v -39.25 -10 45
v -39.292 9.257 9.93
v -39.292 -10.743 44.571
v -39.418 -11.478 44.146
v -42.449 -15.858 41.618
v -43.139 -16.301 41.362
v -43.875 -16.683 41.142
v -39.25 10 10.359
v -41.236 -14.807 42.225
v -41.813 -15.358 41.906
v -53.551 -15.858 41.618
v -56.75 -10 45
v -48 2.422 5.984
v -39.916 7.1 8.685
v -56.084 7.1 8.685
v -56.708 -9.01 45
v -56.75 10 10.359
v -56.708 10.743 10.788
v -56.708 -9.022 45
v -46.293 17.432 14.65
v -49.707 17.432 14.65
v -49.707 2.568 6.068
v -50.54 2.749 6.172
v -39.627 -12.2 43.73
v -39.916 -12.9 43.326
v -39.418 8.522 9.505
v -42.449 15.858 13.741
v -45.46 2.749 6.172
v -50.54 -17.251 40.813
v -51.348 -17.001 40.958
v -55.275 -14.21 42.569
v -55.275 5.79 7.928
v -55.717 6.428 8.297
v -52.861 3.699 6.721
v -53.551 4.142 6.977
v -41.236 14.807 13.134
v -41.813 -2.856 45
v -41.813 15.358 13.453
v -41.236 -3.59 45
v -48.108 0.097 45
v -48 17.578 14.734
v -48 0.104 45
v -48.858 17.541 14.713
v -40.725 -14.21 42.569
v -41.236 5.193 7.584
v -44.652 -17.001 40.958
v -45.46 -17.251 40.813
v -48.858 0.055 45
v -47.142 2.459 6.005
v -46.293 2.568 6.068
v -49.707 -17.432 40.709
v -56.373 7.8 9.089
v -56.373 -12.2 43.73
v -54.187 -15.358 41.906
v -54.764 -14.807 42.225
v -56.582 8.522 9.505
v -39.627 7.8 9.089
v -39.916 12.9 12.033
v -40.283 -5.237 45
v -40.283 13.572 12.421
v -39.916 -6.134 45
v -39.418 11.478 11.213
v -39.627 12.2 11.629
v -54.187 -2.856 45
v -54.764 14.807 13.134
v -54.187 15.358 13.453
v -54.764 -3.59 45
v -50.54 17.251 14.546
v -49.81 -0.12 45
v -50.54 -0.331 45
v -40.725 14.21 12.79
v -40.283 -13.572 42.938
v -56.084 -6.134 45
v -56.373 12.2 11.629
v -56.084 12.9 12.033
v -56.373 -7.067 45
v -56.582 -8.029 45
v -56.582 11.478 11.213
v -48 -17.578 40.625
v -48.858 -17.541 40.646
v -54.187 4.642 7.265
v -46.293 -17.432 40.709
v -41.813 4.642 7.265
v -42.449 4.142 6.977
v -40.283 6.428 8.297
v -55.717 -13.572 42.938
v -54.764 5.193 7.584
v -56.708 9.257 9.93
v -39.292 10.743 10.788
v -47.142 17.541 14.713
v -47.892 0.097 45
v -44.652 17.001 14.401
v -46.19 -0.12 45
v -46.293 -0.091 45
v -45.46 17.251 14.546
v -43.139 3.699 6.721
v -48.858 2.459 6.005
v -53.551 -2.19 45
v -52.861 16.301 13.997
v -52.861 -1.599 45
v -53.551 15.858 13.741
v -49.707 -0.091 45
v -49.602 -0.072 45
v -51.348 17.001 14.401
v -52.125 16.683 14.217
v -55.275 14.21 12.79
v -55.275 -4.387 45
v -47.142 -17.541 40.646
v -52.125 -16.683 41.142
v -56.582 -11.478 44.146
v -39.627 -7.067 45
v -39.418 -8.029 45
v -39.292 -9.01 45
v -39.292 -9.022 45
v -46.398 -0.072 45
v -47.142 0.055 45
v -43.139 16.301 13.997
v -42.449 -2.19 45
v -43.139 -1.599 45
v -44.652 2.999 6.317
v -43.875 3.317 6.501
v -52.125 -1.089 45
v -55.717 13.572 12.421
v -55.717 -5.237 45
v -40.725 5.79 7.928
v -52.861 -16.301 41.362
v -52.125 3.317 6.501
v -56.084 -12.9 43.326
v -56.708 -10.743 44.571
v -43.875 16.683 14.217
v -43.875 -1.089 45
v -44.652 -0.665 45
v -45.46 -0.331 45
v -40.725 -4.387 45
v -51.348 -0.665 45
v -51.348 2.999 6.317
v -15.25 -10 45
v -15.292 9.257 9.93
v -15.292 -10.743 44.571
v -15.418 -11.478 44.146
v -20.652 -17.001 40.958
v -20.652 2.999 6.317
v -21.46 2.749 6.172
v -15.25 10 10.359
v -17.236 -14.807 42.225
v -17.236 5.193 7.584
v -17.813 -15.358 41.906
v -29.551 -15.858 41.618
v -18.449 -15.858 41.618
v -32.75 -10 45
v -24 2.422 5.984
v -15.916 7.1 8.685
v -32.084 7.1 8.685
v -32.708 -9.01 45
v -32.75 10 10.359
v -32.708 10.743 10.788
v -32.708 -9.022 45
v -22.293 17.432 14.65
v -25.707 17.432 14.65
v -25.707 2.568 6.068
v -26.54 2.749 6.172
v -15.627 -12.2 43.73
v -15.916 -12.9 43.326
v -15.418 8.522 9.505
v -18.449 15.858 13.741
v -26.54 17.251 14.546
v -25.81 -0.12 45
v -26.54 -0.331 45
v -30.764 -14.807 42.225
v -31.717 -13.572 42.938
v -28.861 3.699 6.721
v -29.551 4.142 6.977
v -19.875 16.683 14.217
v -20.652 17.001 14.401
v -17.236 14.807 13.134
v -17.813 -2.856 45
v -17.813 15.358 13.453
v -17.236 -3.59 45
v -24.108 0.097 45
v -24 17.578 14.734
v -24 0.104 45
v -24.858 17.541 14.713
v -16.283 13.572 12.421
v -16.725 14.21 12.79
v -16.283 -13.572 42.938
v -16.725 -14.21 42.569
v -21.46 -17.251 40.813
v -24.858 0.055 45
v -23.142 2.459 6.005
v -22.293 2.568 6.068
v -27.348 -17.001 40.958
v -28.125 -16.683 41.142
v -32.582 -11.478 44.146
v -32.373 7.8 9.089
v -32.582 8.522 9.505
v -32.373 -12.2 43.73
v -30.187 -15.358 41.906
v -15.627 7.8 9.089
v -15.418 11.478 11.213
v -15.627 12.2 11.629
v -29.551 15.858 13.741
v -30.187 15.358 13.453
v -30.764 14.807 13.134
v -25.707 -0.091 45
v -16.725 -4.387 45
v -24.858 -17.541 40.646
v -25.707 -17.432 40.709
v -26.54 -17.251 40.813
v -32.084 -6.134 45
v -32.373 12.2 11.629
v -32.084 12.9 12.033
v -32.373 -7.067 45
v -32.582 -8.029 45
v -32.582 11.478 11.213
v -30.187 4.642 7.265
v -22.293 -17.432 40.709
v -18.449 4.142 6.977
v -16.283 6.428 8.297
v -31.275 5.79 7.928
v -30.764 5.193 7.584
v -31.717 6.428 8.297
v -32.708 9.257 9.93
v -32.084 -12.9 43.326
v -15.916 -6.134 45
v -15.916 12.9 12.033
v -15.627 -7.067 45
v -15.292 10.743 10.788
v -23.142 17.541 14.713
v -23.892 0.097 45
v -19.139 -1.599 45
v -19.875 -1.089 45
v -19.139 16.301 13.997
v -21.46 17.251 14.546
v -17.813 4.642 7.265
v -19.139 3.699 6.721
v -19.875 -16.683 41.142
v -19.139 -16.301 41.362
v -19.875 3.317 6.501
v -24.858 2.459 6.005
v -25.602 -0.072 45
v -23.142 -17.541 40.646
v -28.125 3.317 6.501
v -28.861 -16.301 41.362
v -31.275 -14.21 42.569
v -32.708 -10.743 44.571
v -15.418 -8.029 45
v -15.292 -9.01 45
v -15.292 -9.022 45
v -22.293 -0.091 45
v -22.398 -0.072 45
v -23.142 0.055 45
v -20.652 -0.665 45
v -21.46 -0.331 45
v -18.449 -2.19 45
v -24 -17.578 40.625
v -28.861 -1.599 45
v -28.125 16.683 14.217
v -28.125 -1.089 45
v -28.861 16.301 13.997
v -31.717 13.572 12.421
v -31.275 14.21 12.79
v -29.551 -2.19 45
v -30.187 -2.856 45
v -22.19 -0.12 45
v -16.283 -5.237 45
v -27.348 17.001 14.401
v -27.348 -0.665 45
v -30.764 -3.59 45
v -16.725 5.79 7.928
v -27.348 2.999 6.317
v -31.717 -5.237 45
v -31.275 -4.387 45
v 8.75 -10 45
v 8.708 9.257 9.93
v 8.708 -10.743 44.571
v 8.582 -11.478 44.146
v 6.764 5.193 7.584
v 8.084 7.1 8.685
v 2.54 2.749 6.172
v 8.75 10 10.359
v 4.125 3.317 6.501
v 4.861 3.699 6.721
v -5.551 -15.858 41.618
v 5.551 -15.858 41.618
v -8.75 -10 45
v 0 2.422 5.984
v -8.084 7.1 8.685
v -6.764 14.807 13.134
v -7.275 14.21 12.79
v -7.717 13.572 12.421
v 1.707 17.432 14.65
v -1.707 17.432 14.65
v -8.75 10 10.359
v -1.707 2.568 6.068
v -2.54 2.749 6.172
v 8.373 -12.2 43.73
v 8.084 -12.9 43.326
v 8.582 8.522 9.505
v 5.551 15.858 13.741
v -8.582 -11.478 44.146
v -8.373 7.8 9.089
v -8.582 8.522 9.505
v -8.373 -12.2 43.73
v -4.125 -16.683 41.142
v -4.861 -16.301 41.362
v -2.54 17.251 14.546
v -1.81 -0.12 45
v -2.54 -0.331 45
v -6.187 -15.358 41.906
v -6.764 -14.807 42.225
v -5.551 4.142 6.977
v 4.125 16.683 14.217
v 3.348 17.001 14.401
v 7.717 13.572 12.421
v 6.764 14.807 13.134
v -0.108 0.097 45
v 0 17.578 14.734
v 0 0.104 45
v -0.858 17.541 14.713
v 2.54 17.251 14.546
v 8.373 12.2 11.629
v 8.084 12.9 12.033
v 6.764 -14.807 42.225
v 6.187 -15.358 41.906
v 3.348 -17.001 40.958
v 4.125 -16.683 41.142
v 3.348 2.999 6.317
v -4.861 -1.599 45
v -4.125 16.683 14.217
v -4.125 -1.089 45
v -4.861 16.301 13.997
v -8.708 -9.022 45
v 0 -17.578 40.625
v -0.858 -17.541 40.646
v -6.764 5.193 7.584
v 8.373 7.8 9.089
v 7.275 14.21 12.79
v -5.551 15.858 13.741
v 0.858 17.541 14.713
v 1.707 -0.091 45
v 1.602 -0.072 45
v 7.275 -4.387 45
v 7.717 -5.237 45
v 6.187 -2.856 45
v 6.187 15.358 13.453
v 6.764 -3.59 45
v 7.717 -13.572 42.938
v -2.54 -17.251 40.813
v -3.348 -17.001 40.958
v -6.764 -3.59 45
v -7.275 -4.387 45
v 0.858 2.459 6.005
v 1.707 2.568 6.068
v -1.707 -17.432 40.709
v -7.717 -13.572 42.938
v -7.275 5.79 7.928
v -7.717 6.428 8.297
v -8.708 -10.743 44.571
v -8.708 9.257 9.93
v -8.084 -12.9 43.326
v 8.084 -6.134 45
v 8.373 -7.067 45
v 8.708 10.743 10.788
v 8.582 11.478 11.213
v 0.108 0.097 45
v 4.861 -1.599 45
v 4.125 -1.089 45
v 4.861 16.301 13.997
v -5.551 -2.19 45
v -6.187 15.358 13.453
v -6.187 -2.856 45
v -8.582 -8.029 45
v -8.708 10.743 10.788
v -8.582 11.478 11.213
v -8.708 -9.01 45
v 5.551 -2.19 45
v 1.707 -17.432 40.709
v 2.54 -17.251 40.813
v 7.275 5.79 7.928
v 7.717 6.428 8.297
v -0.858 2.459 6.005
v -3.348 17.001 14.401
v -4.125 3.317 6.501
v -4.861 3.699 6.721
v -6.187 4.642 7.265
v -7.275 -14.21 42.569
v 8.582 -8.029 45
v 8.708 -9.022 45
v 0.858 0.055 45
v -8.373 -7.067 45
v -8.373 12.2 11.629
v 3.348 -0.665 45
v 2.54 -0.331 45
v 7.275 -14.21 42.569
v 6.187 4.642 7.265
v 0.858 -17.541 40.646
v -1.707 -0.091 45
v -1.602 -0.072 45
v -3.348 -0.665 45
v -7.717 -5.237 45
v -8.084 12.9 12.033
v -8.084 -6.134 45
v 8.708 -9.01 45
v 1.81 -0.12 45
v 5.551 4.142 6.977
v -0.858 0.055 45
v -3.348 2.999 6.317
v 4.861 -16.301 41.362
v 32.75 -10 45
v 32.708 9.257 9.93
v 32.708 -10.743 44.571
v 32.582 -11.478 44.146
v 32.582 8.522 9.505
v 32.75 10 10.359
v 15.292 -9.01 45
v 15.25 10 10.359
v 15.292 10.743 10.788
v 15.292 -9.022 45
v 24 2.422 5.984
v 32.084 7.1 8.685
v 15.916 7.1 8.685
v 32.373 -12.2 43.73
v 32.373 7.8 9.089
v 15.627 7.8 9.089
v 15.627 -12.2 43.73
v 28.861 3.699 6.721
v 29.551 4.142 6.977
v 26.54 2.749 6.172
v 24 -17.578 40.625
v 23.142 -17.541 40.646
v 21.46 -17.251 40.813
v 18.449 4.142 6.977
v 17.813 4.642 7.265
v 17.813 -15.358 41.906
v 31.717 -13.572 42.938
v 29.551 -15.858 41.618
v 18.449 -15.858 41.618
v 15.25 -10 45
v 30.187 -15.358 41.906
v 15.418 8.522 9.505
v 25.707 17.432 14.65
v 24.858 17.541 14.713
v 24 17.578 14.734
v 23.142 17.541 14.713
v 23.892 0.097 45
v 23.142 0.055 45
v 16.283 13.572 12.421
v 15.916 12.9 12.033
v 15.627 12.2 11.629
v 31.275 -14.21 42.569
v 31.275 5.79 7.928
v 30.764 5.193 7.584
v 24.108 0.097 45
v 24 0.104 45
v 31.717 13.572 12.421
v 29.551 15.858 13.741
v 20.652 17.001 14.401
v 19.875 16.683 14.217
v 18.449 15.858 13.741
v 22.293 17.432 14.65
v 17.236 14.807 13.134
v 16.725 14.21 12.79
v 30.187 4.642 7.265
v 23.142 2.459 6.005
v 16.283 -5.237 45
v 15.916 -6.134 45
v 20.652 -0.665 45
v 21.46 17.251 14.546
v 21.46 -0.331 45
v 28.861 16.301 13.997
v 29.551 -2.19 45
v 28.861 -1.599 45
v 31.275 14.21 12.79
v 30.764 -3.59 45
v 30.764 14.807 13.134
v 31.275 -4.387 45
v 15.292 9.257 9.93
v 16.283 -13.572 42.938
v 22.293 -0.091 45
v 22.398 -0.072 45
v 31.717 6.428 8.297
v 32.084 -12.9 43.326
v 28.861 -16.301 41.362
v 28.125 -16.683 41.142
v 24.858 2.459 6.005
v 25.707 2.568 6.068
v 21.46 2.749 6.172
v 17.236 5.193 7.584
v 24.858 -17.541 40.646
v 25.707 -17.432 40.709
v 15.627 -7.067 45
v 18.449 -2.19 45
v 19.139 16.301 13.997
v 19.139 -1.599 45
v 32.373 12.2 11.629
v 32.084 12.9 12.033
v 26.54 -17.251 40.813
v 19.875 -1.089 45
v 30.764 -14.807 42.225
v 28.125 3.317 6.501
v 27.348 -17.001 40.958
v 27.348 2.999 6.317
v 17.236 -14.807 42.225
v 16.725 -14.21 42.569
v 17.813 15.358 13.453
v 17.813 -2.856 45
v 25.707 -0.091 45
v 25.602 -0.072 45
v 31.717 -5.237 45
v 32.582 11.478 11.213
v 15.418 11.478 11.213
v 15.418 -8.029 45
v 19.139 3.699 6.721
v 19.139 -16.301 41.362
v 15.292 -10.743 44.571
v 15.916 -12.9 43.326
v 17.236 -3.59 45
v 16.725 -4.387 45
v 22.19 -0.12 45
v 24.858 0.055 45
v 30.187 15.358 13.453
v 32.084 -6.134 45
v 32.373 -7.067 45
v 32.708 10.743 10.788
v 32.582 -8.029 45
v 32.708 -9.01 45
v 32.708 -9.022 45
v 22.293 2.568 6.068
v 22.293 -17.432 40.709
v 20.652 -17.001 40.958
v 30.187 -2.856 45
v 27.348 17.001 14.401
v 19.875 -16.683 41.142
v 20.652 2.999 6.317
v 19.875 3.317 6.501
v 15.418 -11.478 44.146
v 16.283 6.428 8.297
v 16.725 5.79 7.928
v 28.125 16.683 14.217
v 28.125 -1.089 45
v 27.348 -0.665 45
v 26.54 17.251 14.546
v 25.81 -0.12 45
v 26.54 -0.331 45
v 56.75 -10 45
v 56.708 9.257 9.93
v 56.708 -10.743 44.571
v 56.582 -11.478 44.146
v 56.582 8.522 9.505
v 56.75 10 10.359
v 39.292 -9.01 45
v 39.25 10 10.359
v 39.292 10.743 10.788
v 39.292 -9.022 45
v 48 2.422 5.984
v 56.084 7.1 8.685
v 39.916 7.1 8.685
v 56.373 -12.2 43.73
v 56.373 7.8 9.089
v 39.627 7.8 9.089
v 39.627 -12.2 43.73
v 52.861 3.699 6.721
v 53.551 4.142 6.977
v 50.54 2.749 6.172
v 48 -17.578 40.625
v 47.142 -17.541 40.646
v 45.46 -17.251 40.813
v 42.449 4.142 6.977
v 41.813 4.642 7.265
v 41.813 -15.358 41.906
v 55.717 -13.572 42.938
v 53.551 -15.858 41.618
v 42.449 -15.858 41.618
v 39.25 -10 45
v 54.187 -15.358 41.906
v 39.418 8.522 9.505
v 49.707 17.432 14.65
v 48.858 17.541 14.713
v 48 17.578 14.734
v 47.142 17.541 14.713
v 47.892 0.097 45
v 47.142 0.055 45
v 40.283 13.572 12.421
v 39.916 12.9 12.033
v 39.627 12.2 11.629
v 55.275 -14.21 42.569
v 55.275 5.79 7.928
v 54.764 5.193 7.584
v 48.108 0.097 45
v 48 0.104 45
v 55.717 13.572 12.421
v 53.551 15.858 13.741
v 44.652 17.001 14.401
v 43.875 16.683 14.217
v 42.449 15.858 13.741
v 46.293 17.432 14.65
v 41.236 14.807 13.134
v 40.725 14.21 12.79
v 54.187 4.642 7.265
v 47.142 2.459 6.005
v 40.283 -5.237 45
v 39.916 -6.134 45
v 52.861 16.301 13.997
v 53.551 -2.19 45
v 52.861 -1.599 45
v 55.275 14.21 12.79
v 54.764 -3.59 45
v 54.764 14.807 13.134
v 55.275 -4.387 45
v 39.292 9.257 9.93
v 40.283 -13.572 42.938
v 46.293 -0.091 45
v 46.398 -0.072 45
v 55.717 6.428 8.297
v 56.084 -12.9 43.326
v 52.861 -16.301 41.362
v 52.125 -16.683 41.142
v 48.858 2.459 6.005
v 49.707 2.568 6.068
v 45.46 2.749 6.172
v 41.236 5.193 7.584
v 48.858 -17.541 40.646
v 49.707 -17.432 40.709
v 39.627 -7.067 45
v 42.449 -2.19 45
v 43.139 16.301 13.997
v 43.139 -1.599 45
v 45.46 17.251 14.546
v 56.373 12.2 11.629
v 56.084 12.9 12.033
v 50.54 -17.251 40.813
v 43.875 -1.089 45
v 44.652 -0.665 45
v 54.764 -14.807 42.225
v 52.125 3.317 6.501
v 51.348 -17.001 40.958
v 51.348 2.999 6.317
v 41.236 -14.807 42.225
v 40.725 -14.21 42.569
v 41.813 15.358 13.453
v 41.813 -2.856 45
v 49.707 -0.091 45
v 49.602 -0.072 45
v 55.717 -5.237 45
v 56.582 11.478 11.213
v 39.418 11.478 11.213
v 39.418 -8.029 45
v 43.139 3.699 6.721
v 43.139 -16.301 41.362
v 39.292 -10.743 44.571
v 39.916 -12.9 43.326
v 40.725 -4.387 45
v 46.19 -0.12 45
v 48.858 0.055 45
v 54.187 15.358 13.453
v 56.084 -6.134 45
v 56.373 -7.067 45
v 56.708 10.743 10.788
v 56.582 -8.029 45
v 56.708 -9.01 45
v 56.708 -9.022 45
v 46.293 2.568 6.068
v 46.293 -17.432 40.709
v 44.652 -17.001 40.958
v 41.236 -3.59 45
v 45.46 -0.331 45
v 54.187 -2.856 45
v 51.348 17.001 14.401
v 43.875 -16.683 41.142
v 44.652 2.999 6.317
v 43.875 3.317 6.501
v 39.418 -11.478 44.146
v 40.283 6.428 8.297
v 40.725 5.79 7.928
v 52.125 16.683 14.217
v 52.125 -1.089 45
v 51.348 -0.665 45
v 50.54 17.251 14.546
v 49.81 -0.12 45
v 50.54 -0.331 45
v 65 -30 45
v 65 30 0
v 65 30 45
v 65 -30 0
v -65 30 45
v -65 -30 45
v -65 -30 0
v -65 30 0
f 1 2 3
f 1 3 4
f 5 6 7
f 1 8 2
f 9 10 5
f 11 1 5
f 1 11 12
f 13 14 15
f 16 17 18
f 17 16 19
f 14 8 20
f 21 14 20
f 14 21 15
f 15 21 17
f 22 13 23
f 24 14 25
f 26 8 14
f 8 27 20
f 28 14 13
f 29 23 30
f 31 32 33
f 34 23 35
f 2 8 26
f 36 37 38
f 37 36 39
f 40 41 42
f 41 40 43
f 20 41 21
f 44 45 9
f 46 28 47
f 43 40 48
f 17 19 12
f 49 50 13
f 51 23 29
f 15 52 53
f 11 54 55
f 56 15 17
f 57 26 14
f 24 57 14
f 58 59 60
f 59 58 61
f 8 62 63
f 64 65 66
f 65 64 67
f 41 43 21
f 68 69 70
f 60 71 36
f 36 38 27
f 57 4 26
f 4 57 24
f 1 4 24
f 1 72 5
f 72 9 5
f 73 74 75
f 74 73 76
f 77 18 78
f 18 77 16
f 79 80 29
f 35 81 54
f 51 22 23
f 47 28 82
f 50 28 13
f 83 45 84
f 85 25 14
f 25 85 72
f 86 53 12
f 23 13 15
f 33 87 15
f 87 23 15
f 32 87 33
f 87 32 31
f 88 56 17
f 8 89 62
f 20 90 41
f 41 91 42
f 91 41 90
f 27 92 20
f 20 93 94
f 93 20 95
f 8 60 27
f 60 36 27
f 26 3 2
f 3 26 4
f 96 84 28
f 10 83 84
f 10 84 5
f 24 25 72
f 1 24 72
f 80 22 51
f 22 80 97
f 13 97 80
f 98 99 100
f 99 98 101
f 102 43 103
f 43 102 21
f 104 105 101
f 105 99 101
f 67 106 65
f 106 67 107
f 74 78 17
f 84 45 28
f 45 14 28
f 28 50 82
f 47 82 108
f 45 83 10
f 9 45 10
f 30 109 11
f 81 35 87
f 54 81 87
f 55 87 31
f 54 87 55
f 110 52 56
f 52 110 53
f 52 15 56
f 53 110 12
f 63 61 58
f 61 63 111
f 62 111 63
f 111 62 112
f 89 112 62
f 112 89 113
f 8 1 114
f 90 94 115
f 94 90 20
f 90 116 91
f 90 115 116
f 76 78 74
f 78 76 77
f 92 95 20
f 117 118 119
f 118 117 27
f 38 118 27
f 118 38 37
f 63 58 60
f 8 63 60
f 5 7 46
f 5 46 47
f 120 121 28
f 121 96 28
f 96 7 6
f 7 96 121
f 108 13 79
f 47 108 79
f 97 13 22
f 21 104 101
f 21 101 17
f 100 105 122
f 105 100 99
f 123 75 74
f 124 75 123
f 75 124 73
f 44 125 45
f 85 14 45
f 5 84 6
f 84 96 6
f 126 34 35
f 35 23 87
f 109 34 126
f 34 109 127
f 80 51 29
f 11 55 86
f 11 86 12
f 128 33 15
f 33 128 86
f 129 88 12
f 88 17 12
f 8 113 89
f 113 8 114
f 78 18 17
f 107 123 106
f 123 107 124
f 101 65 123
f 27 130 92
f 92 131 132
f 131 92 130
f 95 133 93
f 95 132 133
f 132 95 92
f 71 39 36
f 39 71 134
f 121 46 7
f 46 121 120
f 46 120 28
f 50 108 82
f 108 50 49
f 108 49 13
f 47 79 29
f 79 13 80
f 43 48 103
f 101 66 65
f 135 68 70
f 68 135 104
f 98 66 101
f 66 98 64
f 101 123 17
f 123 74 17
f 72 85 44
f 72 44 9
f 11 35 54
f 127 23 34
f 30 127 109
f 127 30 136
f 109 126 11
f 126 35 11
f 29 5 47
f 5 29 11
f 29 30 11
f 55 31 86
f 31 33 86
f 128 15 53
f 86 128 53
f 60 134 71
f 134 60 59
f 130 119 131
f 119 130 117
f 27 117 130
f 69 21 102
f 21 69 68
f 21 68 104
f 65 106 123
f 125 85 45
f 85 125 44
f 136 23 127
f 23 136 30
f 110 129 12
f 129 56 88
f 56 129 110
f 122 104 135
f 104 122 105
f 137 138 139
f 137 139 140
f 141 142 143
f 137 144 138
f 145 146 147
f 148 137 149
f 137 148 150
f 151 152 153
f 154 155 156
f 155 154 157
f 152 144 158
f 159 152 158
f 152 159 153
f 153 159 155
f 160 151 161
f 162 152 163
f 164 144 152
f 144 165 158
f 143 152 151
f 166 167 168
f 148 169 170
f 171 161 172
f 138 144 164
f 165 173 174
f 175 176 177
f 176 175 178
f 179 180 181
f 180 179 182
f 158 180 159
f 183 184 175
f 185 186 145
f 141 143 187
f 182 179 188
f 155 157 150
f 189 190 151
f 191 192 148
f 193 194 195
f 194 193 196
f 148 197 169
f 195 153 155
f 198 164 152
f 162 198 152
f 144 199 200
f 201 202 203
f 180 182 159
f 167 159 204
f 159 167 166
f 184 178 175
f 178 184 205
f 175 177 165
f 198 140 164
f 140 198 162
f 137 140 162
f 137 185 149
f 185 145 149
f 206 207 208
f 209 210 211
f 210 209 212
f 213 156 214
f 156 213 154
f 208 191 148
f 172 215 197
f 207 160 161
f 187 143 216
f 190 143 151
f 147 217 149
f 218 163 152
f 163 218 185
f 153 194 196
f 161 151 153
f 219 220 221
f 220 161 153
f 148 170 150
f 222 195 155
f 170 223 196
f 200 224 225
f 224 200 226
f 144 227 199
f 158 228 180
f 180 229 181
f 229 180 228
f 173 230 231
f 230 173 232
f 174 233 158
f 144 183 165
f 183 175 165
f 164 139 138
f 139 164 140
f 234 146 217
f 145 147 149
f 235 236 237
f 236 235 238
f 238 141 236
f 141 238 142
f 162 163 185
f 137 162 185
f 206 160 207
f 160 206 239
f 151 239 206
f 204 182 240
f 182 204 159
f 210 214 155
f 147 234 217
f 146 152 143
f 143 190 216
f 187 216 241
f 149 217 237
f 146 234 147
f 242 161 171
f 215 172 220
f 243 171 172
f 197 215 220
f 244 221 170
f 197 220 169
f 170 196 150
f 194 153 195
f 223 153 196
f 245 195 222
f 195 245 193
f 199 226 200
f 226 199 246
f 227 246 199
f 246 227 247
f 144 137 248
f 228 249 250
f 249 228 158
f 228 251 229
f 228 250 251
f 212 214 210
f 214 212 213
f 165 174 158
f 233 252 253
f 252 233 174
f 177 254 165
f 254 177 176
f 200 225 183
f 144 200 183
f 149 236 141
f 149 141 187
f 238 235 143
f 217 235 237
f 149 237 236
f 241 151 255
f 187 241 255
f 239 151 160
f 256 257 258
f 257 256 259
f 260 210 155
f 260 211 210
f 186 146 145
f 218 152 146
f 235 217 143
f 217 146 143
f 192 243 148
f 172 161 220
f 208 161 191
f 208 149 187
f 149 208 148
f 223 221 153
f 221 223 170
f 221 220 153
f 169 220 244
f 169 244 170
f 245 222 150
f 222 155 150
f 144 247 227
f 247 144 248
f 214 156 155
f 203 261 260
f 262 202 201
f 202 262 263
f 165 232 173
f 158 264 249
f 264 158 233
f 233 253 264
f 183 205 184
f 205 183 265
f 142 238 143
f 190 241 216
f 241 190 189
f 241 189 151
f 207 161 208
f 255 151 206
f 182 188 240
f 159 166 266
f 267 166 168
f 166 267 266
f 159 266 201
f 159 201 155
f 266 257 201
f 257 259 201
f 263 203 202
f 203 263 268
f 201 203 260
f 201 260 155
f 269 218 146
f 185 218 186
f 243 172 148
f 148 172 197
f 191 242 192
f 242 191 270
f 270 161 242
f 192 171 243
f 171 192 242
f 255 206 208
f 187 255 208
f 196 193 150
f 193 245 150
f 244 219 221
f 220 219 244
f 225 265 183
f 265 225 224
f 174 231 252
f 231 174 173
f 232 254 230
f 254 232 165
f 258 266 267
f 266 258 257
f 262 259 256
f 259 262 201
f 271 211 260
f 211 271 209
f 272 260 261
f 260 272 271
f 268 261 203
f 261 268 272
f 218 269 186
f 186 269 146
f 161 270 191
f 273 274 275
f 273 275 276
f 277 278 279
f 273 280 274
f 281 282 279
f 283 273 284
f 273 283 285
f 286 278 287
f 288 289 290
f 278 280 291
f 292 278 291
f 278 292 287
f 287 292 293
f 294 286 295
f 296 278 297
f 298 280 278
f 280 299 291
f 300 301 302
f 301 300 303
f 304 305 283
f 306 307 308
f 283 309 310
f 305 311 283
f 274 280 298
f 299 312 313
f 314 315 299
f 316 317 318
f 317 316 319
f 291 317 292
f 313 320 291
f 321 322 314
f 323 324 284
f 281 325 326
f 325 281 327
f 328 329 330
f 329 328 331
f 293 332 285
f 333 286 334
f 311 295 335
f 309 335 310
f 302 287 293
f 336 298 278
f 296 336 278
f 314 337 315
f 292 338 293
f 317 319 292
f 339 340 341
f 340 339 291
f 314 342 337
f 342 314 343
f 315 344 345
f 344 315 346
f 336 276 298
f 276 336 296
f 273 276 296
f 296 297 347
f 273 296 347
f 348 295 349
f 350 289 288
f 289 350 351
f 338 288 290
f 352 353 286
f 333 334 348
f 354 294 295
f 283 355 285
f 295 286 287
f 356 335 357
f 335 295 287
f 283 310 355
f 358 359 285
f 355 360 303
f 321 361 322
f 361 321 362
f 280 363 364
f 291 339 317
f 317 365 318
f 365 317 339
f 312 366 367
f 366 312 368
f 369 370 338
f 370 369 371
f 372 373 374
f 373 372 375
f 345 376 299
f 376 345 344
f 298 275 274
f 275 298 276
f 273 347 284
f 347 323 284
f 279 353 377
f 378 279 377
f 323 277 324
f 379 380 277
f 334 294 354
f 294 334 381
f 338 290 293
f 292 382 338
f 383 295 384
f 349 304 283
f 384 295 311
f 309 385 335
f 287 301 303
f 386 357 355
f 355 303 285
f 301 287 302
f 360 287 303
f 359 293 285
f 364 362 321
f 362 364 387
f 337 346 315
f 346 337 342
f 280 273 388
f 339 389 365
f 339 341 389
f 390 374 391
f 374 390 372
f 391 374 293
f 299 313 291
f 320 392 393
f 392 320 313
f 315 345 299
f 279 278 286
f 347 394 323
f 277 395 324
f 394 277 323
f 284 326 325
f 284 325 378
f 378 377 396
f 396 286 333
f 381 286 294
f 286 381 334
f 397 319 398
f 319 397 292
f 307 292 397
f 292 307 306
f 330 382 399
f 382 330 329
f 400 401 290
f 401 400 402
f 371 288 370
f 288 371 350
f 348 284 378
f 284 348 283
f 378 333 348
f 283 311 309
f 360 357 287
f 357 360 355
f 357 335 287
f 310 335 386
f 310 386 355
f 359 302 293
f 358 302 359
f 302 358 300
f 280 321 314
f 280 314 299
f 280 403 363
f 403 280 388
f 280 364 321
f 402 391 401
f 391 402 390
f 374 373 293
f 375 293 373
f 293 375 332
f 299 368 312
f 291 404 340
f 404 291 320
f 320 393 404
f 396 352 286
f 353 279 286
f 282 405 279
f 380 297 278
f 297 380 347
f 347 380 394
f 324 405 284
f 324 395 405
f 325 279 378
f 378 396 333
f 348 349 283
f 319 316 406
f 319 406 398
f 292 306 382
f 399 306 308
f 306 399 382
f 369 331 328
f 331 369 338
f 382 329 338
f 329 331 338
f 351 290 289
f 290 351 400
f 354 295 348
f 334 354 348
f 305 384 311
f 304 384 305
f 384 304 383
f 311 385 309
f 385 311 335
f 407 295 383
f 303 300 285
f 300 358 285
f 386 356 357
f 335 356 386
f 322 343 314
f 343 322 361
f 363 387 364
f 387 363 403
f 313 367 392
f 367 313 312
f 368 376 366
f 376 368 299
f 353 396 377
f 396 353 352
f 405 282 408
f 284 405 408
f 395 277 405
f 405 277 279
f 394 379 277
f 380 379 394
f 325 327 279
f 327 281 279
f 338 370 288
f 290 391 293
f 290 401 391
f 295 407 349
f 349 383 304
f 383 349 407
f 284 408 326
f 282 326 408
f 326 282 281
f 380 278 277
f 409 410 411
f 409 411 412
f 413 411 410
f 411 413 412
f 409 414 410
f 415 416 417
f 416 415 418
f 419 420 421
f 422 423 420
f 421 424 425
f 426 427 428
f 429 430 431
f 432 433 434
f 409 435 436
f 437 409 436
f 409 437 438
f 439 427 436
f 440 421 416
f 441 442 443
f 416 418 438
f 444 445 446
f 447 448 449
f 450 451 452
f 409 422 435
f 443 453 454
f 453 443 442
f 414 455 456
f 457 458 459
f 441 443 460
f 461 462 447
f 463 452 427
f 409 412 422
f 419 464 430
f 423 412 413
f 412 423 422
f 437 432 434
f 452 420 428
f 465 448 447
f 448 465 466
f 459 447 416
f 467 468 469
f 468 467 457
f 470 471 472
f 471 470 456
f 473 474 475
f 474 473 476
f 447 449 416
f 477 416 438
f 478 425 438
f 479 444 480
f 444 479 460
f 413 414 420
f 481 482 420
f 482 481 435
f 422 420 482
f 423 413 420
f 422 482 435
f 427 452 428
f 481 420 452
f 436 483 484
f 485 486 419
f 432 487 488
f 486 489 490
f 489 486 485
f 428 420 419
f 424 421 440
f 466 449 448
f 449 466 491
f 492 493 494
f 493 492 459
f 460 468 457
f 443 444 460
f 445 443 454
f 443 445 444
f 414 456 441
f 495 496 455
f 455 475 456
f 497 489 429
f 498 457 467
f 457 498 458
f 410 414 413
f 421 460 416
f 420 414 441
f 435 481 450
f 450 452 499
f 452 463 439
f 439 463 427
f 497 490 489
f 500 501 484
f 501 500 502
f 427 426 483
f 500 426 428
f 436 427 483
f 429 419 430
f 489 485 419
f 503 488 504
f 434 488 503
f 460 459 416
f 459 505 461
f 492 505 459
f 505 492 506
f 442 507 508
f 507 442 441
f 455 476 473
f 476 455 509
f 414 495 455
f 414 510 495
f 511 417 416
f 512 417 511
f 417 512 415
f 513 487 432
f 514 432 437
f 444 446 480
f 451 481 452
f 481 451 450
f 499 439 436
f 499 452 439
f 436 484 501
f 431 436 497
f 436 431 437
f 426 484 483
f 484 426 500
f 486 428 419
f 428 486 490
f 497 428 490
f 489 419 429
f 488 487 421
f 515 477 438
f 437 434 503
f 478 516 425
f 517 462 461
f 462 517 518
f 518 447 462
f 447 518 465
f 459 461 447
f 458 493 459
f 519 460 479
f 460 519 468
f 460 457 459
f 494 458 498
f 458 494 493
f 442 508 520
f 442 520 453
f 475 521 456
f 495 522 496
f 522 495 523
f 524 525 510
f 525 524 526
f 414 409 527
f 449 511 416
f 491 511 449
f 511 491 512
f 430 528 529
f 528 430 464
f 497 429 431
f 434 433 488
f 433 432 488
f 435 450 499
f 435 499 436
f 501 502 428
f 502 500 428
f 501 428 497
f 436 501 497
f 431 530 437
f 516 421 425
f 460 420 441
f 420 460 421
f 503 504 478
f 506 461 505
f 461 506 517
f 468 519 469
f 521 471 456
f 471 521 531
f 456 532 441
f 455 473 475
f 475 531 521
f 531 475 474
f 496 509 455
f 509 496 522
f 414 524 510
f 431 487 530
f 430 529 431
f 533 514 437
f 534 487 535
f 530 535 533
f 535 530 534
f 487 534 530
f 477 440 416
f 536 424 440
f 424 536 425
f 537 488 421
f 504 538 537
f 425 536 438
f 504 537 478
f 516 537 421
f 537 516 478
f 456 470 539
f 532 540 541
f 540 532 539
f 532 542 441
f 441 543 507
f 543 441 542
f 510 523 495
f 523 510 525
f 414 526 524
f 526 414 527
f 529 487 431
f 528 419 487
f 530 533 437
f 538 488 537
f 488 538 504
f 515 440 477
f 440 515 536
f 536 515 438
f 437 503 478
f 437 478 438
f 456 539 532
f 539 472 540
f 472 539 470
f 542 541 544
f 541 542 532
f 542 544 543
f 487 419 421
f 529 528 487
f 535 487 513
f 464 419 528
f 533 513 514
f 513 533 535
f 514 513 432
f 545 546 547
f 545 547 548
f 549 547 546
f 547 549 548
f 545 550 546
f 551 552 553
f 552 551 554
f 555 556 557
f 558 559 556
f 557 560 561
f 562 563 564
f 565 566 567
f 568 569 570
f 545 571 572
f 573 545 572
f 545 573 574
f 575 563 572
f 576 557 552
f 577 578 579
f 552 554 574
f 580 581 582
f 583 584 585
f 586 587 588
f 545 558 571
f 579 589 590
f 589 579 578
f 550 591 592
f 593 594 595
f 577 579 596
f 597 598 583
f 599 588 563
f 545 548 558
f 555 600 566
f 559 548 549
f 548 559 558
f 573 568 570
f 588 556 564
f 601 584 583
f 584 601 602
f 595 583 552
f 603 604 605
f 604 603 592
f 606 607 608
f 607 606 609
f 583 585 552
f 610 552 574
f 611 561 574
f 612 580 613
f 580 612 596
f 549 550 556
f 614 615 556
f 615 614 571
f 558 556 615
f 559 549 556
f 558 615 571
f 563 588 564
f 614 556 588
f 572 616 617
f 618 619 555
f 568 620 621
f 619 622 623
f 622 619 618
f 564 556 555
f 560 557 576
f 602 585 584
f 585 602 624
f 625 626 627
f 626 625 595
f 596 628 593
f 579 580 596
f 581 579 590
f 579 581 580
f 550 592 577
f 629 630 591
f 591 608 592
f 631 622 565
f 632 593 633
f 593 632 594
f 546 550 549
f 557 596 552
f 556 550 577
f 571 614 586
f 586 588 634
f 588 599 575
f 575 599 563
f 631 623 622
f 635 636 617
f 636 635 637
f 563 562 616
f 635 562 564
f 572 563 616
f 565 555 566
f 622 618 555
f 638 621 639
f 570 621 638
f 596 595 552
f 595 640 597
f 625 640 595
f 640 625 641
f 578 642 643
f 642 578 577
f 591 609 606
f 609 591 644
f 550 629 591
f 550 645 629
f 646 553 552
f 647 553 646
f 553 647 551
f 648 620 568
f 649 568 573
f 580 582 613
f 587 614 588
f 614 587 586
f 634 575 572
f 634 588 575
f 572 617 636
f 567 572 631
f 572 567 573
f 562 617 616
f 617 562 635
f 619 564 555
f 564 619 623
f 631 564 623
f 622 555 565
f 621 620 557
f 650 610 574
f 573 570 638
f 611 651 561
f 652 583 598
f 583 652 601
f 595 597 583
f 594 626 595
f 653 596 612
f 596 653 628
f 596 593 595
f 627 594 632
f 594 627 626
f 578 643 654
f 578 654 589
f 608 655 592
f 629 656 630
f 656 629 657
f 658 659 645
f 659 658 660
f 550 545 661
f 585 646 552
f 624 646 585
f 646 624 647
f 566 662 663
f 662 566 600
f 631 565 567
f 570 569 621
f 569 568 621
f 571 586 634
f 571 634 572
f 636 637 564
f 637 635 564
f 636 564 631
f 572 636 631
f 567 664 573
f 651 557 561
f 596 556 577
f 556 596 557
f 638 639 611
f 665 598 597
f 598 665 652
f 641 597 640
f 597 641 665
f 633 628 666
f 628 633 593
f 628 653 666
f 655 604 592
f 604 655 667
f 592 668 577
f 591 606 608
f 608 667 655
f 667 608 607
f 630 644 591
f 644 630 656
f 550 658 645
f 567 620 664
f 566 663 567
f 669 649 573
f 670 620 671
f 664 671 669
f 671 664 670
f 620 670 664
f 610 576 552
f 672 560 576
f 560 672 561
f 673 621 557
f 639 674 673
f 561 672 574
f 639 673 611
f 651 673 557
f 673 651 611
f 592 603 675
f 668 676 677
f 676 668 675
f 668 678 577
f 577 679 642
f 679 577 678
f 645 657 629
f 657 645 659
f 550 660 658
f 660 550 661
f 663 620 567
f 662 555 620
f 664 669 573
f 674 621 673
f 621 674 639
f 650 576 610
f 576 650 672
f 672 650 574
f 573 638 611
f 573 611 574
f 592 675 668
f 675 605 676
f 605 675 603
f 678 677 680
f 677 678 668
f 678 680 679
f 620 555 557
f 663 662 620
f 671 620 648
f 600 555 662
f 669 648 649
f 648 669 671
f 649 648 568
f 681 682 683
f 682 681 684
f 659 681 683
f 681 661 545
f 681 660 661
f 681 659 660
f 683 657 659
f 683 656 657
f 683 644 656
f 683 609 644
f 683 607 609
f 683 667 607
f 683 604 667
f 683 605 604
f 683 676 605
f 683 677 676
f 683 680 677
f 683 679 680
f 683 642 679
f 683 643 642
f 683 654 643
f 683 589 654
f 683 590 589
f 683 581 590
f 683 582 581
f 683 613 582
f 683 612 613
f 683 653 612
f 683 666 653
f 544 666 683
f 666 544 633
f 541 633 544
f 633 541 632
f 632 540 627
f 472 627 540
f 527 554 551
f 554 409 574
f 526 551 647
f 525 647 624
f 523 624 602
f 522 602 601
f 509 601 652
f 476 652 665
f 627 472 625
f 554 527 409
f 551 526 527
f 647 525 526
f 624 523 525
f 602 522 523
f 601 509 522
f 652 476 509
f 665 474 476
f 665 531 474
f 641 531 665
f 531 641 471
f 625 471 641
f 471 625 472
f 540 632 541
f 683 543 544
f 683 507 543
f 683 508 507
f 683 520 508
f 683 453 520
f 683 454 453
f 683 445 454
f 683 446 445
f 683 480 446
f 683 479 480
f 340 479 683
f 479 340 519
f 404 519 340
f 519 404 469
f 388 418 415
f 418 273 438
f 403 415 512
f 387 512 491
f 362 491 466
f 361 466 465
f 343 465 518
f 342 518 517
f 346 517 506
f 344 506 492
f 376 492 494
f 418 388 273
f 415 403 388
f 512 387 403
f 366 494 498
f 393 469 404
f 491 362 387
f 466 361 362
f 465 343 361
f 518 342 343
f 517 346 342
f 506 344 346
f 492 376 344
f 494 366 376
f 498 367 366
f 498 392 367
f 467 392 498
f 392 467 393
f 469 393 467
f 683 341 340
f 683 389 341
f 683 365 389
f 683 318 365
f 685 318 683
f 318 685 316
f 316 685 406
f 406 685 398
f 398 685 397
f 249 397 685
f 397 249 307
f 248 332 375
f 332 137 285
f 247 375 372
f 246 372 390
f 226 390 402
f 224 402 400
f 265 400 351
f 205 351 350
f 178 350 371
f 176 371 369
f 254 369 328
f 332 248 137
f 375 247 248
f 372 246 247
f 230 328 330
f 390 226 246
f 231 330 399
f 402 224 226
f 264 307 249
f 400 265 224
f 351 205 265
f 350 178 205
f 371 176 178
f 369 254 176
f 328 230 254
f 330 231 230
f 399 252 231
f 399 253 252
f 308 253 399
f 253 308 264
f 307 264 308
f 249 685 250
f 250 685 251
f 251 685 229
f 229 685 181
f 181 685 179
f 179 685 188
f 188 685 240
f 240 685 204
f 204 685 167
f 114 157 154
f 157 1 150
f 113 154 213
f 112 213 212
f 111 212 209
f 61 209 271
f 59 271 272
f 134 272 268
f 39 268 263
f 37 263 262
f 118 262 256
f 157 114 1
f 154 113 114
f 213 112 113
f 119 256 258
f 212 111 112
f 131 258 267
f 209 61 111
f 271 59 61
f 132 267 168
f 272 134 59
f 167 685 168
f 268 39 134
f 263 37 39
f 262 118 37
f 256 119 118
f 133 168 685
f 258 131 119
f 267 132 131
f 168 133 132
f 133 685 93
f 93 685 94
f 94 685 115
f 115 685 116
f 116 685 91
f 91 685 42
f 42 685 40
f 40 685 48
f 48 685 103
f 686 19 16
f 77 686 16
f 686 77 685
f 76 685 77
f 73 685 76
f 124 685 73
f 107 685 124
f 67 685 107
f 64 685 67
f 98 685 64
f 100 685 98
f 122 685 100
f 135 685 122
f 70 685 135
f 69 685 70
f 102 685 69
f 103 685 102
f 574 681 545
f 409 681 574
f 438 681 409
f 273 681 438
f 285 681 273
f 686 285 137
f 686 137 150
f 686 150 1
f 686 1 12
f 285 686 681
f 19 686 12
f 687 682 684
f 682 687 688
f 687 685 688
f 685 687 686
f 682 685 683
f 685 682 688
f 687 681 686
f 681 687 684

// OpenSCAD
// Dimensions
block_length = 130;      // X dimension
block_depth = 60;        // Y dimension
block_height = 45;       // Z dimension
hole_diameter = 17.5;    // diameter of each hole
hole_radius = hole_diameter / 2;
hole_depth = 40;         // depth along the axis
hole_count = 5;
hole_spacing = 24;       // spacing between hole centers (X direction)
y_opening = -10;         // Y position where hole opens
fn_value = 64;           // fragment number for smooth curves

// Calculate hole positions along X
total_span = (hole_count - 1) * hole_spacing;
start_x = -total_span / 2;

// Main structure with five angled holes
difference() {
    // Solid rectangular block
    translate([-block_length / 2, -block_depth / 2, 0])
        cube([block_length, block_depth, block_height]);
    
    // Subtract the five blind holes
    for (i = [0 : hole_count - 1]) {
        x_pos = start_x + i * hole_spacing;
        
        // Each hole: cylinder rotated 210° around X-axis
        // (30° from vertical, tilting toward +Y as it goes down)
        translate([x_pos, y_opening, block_height])
        rotate([210, 0, 0])
        cylinder(r=hole_radius, h=hole_depth, $fn=fn_value);
    }
}
